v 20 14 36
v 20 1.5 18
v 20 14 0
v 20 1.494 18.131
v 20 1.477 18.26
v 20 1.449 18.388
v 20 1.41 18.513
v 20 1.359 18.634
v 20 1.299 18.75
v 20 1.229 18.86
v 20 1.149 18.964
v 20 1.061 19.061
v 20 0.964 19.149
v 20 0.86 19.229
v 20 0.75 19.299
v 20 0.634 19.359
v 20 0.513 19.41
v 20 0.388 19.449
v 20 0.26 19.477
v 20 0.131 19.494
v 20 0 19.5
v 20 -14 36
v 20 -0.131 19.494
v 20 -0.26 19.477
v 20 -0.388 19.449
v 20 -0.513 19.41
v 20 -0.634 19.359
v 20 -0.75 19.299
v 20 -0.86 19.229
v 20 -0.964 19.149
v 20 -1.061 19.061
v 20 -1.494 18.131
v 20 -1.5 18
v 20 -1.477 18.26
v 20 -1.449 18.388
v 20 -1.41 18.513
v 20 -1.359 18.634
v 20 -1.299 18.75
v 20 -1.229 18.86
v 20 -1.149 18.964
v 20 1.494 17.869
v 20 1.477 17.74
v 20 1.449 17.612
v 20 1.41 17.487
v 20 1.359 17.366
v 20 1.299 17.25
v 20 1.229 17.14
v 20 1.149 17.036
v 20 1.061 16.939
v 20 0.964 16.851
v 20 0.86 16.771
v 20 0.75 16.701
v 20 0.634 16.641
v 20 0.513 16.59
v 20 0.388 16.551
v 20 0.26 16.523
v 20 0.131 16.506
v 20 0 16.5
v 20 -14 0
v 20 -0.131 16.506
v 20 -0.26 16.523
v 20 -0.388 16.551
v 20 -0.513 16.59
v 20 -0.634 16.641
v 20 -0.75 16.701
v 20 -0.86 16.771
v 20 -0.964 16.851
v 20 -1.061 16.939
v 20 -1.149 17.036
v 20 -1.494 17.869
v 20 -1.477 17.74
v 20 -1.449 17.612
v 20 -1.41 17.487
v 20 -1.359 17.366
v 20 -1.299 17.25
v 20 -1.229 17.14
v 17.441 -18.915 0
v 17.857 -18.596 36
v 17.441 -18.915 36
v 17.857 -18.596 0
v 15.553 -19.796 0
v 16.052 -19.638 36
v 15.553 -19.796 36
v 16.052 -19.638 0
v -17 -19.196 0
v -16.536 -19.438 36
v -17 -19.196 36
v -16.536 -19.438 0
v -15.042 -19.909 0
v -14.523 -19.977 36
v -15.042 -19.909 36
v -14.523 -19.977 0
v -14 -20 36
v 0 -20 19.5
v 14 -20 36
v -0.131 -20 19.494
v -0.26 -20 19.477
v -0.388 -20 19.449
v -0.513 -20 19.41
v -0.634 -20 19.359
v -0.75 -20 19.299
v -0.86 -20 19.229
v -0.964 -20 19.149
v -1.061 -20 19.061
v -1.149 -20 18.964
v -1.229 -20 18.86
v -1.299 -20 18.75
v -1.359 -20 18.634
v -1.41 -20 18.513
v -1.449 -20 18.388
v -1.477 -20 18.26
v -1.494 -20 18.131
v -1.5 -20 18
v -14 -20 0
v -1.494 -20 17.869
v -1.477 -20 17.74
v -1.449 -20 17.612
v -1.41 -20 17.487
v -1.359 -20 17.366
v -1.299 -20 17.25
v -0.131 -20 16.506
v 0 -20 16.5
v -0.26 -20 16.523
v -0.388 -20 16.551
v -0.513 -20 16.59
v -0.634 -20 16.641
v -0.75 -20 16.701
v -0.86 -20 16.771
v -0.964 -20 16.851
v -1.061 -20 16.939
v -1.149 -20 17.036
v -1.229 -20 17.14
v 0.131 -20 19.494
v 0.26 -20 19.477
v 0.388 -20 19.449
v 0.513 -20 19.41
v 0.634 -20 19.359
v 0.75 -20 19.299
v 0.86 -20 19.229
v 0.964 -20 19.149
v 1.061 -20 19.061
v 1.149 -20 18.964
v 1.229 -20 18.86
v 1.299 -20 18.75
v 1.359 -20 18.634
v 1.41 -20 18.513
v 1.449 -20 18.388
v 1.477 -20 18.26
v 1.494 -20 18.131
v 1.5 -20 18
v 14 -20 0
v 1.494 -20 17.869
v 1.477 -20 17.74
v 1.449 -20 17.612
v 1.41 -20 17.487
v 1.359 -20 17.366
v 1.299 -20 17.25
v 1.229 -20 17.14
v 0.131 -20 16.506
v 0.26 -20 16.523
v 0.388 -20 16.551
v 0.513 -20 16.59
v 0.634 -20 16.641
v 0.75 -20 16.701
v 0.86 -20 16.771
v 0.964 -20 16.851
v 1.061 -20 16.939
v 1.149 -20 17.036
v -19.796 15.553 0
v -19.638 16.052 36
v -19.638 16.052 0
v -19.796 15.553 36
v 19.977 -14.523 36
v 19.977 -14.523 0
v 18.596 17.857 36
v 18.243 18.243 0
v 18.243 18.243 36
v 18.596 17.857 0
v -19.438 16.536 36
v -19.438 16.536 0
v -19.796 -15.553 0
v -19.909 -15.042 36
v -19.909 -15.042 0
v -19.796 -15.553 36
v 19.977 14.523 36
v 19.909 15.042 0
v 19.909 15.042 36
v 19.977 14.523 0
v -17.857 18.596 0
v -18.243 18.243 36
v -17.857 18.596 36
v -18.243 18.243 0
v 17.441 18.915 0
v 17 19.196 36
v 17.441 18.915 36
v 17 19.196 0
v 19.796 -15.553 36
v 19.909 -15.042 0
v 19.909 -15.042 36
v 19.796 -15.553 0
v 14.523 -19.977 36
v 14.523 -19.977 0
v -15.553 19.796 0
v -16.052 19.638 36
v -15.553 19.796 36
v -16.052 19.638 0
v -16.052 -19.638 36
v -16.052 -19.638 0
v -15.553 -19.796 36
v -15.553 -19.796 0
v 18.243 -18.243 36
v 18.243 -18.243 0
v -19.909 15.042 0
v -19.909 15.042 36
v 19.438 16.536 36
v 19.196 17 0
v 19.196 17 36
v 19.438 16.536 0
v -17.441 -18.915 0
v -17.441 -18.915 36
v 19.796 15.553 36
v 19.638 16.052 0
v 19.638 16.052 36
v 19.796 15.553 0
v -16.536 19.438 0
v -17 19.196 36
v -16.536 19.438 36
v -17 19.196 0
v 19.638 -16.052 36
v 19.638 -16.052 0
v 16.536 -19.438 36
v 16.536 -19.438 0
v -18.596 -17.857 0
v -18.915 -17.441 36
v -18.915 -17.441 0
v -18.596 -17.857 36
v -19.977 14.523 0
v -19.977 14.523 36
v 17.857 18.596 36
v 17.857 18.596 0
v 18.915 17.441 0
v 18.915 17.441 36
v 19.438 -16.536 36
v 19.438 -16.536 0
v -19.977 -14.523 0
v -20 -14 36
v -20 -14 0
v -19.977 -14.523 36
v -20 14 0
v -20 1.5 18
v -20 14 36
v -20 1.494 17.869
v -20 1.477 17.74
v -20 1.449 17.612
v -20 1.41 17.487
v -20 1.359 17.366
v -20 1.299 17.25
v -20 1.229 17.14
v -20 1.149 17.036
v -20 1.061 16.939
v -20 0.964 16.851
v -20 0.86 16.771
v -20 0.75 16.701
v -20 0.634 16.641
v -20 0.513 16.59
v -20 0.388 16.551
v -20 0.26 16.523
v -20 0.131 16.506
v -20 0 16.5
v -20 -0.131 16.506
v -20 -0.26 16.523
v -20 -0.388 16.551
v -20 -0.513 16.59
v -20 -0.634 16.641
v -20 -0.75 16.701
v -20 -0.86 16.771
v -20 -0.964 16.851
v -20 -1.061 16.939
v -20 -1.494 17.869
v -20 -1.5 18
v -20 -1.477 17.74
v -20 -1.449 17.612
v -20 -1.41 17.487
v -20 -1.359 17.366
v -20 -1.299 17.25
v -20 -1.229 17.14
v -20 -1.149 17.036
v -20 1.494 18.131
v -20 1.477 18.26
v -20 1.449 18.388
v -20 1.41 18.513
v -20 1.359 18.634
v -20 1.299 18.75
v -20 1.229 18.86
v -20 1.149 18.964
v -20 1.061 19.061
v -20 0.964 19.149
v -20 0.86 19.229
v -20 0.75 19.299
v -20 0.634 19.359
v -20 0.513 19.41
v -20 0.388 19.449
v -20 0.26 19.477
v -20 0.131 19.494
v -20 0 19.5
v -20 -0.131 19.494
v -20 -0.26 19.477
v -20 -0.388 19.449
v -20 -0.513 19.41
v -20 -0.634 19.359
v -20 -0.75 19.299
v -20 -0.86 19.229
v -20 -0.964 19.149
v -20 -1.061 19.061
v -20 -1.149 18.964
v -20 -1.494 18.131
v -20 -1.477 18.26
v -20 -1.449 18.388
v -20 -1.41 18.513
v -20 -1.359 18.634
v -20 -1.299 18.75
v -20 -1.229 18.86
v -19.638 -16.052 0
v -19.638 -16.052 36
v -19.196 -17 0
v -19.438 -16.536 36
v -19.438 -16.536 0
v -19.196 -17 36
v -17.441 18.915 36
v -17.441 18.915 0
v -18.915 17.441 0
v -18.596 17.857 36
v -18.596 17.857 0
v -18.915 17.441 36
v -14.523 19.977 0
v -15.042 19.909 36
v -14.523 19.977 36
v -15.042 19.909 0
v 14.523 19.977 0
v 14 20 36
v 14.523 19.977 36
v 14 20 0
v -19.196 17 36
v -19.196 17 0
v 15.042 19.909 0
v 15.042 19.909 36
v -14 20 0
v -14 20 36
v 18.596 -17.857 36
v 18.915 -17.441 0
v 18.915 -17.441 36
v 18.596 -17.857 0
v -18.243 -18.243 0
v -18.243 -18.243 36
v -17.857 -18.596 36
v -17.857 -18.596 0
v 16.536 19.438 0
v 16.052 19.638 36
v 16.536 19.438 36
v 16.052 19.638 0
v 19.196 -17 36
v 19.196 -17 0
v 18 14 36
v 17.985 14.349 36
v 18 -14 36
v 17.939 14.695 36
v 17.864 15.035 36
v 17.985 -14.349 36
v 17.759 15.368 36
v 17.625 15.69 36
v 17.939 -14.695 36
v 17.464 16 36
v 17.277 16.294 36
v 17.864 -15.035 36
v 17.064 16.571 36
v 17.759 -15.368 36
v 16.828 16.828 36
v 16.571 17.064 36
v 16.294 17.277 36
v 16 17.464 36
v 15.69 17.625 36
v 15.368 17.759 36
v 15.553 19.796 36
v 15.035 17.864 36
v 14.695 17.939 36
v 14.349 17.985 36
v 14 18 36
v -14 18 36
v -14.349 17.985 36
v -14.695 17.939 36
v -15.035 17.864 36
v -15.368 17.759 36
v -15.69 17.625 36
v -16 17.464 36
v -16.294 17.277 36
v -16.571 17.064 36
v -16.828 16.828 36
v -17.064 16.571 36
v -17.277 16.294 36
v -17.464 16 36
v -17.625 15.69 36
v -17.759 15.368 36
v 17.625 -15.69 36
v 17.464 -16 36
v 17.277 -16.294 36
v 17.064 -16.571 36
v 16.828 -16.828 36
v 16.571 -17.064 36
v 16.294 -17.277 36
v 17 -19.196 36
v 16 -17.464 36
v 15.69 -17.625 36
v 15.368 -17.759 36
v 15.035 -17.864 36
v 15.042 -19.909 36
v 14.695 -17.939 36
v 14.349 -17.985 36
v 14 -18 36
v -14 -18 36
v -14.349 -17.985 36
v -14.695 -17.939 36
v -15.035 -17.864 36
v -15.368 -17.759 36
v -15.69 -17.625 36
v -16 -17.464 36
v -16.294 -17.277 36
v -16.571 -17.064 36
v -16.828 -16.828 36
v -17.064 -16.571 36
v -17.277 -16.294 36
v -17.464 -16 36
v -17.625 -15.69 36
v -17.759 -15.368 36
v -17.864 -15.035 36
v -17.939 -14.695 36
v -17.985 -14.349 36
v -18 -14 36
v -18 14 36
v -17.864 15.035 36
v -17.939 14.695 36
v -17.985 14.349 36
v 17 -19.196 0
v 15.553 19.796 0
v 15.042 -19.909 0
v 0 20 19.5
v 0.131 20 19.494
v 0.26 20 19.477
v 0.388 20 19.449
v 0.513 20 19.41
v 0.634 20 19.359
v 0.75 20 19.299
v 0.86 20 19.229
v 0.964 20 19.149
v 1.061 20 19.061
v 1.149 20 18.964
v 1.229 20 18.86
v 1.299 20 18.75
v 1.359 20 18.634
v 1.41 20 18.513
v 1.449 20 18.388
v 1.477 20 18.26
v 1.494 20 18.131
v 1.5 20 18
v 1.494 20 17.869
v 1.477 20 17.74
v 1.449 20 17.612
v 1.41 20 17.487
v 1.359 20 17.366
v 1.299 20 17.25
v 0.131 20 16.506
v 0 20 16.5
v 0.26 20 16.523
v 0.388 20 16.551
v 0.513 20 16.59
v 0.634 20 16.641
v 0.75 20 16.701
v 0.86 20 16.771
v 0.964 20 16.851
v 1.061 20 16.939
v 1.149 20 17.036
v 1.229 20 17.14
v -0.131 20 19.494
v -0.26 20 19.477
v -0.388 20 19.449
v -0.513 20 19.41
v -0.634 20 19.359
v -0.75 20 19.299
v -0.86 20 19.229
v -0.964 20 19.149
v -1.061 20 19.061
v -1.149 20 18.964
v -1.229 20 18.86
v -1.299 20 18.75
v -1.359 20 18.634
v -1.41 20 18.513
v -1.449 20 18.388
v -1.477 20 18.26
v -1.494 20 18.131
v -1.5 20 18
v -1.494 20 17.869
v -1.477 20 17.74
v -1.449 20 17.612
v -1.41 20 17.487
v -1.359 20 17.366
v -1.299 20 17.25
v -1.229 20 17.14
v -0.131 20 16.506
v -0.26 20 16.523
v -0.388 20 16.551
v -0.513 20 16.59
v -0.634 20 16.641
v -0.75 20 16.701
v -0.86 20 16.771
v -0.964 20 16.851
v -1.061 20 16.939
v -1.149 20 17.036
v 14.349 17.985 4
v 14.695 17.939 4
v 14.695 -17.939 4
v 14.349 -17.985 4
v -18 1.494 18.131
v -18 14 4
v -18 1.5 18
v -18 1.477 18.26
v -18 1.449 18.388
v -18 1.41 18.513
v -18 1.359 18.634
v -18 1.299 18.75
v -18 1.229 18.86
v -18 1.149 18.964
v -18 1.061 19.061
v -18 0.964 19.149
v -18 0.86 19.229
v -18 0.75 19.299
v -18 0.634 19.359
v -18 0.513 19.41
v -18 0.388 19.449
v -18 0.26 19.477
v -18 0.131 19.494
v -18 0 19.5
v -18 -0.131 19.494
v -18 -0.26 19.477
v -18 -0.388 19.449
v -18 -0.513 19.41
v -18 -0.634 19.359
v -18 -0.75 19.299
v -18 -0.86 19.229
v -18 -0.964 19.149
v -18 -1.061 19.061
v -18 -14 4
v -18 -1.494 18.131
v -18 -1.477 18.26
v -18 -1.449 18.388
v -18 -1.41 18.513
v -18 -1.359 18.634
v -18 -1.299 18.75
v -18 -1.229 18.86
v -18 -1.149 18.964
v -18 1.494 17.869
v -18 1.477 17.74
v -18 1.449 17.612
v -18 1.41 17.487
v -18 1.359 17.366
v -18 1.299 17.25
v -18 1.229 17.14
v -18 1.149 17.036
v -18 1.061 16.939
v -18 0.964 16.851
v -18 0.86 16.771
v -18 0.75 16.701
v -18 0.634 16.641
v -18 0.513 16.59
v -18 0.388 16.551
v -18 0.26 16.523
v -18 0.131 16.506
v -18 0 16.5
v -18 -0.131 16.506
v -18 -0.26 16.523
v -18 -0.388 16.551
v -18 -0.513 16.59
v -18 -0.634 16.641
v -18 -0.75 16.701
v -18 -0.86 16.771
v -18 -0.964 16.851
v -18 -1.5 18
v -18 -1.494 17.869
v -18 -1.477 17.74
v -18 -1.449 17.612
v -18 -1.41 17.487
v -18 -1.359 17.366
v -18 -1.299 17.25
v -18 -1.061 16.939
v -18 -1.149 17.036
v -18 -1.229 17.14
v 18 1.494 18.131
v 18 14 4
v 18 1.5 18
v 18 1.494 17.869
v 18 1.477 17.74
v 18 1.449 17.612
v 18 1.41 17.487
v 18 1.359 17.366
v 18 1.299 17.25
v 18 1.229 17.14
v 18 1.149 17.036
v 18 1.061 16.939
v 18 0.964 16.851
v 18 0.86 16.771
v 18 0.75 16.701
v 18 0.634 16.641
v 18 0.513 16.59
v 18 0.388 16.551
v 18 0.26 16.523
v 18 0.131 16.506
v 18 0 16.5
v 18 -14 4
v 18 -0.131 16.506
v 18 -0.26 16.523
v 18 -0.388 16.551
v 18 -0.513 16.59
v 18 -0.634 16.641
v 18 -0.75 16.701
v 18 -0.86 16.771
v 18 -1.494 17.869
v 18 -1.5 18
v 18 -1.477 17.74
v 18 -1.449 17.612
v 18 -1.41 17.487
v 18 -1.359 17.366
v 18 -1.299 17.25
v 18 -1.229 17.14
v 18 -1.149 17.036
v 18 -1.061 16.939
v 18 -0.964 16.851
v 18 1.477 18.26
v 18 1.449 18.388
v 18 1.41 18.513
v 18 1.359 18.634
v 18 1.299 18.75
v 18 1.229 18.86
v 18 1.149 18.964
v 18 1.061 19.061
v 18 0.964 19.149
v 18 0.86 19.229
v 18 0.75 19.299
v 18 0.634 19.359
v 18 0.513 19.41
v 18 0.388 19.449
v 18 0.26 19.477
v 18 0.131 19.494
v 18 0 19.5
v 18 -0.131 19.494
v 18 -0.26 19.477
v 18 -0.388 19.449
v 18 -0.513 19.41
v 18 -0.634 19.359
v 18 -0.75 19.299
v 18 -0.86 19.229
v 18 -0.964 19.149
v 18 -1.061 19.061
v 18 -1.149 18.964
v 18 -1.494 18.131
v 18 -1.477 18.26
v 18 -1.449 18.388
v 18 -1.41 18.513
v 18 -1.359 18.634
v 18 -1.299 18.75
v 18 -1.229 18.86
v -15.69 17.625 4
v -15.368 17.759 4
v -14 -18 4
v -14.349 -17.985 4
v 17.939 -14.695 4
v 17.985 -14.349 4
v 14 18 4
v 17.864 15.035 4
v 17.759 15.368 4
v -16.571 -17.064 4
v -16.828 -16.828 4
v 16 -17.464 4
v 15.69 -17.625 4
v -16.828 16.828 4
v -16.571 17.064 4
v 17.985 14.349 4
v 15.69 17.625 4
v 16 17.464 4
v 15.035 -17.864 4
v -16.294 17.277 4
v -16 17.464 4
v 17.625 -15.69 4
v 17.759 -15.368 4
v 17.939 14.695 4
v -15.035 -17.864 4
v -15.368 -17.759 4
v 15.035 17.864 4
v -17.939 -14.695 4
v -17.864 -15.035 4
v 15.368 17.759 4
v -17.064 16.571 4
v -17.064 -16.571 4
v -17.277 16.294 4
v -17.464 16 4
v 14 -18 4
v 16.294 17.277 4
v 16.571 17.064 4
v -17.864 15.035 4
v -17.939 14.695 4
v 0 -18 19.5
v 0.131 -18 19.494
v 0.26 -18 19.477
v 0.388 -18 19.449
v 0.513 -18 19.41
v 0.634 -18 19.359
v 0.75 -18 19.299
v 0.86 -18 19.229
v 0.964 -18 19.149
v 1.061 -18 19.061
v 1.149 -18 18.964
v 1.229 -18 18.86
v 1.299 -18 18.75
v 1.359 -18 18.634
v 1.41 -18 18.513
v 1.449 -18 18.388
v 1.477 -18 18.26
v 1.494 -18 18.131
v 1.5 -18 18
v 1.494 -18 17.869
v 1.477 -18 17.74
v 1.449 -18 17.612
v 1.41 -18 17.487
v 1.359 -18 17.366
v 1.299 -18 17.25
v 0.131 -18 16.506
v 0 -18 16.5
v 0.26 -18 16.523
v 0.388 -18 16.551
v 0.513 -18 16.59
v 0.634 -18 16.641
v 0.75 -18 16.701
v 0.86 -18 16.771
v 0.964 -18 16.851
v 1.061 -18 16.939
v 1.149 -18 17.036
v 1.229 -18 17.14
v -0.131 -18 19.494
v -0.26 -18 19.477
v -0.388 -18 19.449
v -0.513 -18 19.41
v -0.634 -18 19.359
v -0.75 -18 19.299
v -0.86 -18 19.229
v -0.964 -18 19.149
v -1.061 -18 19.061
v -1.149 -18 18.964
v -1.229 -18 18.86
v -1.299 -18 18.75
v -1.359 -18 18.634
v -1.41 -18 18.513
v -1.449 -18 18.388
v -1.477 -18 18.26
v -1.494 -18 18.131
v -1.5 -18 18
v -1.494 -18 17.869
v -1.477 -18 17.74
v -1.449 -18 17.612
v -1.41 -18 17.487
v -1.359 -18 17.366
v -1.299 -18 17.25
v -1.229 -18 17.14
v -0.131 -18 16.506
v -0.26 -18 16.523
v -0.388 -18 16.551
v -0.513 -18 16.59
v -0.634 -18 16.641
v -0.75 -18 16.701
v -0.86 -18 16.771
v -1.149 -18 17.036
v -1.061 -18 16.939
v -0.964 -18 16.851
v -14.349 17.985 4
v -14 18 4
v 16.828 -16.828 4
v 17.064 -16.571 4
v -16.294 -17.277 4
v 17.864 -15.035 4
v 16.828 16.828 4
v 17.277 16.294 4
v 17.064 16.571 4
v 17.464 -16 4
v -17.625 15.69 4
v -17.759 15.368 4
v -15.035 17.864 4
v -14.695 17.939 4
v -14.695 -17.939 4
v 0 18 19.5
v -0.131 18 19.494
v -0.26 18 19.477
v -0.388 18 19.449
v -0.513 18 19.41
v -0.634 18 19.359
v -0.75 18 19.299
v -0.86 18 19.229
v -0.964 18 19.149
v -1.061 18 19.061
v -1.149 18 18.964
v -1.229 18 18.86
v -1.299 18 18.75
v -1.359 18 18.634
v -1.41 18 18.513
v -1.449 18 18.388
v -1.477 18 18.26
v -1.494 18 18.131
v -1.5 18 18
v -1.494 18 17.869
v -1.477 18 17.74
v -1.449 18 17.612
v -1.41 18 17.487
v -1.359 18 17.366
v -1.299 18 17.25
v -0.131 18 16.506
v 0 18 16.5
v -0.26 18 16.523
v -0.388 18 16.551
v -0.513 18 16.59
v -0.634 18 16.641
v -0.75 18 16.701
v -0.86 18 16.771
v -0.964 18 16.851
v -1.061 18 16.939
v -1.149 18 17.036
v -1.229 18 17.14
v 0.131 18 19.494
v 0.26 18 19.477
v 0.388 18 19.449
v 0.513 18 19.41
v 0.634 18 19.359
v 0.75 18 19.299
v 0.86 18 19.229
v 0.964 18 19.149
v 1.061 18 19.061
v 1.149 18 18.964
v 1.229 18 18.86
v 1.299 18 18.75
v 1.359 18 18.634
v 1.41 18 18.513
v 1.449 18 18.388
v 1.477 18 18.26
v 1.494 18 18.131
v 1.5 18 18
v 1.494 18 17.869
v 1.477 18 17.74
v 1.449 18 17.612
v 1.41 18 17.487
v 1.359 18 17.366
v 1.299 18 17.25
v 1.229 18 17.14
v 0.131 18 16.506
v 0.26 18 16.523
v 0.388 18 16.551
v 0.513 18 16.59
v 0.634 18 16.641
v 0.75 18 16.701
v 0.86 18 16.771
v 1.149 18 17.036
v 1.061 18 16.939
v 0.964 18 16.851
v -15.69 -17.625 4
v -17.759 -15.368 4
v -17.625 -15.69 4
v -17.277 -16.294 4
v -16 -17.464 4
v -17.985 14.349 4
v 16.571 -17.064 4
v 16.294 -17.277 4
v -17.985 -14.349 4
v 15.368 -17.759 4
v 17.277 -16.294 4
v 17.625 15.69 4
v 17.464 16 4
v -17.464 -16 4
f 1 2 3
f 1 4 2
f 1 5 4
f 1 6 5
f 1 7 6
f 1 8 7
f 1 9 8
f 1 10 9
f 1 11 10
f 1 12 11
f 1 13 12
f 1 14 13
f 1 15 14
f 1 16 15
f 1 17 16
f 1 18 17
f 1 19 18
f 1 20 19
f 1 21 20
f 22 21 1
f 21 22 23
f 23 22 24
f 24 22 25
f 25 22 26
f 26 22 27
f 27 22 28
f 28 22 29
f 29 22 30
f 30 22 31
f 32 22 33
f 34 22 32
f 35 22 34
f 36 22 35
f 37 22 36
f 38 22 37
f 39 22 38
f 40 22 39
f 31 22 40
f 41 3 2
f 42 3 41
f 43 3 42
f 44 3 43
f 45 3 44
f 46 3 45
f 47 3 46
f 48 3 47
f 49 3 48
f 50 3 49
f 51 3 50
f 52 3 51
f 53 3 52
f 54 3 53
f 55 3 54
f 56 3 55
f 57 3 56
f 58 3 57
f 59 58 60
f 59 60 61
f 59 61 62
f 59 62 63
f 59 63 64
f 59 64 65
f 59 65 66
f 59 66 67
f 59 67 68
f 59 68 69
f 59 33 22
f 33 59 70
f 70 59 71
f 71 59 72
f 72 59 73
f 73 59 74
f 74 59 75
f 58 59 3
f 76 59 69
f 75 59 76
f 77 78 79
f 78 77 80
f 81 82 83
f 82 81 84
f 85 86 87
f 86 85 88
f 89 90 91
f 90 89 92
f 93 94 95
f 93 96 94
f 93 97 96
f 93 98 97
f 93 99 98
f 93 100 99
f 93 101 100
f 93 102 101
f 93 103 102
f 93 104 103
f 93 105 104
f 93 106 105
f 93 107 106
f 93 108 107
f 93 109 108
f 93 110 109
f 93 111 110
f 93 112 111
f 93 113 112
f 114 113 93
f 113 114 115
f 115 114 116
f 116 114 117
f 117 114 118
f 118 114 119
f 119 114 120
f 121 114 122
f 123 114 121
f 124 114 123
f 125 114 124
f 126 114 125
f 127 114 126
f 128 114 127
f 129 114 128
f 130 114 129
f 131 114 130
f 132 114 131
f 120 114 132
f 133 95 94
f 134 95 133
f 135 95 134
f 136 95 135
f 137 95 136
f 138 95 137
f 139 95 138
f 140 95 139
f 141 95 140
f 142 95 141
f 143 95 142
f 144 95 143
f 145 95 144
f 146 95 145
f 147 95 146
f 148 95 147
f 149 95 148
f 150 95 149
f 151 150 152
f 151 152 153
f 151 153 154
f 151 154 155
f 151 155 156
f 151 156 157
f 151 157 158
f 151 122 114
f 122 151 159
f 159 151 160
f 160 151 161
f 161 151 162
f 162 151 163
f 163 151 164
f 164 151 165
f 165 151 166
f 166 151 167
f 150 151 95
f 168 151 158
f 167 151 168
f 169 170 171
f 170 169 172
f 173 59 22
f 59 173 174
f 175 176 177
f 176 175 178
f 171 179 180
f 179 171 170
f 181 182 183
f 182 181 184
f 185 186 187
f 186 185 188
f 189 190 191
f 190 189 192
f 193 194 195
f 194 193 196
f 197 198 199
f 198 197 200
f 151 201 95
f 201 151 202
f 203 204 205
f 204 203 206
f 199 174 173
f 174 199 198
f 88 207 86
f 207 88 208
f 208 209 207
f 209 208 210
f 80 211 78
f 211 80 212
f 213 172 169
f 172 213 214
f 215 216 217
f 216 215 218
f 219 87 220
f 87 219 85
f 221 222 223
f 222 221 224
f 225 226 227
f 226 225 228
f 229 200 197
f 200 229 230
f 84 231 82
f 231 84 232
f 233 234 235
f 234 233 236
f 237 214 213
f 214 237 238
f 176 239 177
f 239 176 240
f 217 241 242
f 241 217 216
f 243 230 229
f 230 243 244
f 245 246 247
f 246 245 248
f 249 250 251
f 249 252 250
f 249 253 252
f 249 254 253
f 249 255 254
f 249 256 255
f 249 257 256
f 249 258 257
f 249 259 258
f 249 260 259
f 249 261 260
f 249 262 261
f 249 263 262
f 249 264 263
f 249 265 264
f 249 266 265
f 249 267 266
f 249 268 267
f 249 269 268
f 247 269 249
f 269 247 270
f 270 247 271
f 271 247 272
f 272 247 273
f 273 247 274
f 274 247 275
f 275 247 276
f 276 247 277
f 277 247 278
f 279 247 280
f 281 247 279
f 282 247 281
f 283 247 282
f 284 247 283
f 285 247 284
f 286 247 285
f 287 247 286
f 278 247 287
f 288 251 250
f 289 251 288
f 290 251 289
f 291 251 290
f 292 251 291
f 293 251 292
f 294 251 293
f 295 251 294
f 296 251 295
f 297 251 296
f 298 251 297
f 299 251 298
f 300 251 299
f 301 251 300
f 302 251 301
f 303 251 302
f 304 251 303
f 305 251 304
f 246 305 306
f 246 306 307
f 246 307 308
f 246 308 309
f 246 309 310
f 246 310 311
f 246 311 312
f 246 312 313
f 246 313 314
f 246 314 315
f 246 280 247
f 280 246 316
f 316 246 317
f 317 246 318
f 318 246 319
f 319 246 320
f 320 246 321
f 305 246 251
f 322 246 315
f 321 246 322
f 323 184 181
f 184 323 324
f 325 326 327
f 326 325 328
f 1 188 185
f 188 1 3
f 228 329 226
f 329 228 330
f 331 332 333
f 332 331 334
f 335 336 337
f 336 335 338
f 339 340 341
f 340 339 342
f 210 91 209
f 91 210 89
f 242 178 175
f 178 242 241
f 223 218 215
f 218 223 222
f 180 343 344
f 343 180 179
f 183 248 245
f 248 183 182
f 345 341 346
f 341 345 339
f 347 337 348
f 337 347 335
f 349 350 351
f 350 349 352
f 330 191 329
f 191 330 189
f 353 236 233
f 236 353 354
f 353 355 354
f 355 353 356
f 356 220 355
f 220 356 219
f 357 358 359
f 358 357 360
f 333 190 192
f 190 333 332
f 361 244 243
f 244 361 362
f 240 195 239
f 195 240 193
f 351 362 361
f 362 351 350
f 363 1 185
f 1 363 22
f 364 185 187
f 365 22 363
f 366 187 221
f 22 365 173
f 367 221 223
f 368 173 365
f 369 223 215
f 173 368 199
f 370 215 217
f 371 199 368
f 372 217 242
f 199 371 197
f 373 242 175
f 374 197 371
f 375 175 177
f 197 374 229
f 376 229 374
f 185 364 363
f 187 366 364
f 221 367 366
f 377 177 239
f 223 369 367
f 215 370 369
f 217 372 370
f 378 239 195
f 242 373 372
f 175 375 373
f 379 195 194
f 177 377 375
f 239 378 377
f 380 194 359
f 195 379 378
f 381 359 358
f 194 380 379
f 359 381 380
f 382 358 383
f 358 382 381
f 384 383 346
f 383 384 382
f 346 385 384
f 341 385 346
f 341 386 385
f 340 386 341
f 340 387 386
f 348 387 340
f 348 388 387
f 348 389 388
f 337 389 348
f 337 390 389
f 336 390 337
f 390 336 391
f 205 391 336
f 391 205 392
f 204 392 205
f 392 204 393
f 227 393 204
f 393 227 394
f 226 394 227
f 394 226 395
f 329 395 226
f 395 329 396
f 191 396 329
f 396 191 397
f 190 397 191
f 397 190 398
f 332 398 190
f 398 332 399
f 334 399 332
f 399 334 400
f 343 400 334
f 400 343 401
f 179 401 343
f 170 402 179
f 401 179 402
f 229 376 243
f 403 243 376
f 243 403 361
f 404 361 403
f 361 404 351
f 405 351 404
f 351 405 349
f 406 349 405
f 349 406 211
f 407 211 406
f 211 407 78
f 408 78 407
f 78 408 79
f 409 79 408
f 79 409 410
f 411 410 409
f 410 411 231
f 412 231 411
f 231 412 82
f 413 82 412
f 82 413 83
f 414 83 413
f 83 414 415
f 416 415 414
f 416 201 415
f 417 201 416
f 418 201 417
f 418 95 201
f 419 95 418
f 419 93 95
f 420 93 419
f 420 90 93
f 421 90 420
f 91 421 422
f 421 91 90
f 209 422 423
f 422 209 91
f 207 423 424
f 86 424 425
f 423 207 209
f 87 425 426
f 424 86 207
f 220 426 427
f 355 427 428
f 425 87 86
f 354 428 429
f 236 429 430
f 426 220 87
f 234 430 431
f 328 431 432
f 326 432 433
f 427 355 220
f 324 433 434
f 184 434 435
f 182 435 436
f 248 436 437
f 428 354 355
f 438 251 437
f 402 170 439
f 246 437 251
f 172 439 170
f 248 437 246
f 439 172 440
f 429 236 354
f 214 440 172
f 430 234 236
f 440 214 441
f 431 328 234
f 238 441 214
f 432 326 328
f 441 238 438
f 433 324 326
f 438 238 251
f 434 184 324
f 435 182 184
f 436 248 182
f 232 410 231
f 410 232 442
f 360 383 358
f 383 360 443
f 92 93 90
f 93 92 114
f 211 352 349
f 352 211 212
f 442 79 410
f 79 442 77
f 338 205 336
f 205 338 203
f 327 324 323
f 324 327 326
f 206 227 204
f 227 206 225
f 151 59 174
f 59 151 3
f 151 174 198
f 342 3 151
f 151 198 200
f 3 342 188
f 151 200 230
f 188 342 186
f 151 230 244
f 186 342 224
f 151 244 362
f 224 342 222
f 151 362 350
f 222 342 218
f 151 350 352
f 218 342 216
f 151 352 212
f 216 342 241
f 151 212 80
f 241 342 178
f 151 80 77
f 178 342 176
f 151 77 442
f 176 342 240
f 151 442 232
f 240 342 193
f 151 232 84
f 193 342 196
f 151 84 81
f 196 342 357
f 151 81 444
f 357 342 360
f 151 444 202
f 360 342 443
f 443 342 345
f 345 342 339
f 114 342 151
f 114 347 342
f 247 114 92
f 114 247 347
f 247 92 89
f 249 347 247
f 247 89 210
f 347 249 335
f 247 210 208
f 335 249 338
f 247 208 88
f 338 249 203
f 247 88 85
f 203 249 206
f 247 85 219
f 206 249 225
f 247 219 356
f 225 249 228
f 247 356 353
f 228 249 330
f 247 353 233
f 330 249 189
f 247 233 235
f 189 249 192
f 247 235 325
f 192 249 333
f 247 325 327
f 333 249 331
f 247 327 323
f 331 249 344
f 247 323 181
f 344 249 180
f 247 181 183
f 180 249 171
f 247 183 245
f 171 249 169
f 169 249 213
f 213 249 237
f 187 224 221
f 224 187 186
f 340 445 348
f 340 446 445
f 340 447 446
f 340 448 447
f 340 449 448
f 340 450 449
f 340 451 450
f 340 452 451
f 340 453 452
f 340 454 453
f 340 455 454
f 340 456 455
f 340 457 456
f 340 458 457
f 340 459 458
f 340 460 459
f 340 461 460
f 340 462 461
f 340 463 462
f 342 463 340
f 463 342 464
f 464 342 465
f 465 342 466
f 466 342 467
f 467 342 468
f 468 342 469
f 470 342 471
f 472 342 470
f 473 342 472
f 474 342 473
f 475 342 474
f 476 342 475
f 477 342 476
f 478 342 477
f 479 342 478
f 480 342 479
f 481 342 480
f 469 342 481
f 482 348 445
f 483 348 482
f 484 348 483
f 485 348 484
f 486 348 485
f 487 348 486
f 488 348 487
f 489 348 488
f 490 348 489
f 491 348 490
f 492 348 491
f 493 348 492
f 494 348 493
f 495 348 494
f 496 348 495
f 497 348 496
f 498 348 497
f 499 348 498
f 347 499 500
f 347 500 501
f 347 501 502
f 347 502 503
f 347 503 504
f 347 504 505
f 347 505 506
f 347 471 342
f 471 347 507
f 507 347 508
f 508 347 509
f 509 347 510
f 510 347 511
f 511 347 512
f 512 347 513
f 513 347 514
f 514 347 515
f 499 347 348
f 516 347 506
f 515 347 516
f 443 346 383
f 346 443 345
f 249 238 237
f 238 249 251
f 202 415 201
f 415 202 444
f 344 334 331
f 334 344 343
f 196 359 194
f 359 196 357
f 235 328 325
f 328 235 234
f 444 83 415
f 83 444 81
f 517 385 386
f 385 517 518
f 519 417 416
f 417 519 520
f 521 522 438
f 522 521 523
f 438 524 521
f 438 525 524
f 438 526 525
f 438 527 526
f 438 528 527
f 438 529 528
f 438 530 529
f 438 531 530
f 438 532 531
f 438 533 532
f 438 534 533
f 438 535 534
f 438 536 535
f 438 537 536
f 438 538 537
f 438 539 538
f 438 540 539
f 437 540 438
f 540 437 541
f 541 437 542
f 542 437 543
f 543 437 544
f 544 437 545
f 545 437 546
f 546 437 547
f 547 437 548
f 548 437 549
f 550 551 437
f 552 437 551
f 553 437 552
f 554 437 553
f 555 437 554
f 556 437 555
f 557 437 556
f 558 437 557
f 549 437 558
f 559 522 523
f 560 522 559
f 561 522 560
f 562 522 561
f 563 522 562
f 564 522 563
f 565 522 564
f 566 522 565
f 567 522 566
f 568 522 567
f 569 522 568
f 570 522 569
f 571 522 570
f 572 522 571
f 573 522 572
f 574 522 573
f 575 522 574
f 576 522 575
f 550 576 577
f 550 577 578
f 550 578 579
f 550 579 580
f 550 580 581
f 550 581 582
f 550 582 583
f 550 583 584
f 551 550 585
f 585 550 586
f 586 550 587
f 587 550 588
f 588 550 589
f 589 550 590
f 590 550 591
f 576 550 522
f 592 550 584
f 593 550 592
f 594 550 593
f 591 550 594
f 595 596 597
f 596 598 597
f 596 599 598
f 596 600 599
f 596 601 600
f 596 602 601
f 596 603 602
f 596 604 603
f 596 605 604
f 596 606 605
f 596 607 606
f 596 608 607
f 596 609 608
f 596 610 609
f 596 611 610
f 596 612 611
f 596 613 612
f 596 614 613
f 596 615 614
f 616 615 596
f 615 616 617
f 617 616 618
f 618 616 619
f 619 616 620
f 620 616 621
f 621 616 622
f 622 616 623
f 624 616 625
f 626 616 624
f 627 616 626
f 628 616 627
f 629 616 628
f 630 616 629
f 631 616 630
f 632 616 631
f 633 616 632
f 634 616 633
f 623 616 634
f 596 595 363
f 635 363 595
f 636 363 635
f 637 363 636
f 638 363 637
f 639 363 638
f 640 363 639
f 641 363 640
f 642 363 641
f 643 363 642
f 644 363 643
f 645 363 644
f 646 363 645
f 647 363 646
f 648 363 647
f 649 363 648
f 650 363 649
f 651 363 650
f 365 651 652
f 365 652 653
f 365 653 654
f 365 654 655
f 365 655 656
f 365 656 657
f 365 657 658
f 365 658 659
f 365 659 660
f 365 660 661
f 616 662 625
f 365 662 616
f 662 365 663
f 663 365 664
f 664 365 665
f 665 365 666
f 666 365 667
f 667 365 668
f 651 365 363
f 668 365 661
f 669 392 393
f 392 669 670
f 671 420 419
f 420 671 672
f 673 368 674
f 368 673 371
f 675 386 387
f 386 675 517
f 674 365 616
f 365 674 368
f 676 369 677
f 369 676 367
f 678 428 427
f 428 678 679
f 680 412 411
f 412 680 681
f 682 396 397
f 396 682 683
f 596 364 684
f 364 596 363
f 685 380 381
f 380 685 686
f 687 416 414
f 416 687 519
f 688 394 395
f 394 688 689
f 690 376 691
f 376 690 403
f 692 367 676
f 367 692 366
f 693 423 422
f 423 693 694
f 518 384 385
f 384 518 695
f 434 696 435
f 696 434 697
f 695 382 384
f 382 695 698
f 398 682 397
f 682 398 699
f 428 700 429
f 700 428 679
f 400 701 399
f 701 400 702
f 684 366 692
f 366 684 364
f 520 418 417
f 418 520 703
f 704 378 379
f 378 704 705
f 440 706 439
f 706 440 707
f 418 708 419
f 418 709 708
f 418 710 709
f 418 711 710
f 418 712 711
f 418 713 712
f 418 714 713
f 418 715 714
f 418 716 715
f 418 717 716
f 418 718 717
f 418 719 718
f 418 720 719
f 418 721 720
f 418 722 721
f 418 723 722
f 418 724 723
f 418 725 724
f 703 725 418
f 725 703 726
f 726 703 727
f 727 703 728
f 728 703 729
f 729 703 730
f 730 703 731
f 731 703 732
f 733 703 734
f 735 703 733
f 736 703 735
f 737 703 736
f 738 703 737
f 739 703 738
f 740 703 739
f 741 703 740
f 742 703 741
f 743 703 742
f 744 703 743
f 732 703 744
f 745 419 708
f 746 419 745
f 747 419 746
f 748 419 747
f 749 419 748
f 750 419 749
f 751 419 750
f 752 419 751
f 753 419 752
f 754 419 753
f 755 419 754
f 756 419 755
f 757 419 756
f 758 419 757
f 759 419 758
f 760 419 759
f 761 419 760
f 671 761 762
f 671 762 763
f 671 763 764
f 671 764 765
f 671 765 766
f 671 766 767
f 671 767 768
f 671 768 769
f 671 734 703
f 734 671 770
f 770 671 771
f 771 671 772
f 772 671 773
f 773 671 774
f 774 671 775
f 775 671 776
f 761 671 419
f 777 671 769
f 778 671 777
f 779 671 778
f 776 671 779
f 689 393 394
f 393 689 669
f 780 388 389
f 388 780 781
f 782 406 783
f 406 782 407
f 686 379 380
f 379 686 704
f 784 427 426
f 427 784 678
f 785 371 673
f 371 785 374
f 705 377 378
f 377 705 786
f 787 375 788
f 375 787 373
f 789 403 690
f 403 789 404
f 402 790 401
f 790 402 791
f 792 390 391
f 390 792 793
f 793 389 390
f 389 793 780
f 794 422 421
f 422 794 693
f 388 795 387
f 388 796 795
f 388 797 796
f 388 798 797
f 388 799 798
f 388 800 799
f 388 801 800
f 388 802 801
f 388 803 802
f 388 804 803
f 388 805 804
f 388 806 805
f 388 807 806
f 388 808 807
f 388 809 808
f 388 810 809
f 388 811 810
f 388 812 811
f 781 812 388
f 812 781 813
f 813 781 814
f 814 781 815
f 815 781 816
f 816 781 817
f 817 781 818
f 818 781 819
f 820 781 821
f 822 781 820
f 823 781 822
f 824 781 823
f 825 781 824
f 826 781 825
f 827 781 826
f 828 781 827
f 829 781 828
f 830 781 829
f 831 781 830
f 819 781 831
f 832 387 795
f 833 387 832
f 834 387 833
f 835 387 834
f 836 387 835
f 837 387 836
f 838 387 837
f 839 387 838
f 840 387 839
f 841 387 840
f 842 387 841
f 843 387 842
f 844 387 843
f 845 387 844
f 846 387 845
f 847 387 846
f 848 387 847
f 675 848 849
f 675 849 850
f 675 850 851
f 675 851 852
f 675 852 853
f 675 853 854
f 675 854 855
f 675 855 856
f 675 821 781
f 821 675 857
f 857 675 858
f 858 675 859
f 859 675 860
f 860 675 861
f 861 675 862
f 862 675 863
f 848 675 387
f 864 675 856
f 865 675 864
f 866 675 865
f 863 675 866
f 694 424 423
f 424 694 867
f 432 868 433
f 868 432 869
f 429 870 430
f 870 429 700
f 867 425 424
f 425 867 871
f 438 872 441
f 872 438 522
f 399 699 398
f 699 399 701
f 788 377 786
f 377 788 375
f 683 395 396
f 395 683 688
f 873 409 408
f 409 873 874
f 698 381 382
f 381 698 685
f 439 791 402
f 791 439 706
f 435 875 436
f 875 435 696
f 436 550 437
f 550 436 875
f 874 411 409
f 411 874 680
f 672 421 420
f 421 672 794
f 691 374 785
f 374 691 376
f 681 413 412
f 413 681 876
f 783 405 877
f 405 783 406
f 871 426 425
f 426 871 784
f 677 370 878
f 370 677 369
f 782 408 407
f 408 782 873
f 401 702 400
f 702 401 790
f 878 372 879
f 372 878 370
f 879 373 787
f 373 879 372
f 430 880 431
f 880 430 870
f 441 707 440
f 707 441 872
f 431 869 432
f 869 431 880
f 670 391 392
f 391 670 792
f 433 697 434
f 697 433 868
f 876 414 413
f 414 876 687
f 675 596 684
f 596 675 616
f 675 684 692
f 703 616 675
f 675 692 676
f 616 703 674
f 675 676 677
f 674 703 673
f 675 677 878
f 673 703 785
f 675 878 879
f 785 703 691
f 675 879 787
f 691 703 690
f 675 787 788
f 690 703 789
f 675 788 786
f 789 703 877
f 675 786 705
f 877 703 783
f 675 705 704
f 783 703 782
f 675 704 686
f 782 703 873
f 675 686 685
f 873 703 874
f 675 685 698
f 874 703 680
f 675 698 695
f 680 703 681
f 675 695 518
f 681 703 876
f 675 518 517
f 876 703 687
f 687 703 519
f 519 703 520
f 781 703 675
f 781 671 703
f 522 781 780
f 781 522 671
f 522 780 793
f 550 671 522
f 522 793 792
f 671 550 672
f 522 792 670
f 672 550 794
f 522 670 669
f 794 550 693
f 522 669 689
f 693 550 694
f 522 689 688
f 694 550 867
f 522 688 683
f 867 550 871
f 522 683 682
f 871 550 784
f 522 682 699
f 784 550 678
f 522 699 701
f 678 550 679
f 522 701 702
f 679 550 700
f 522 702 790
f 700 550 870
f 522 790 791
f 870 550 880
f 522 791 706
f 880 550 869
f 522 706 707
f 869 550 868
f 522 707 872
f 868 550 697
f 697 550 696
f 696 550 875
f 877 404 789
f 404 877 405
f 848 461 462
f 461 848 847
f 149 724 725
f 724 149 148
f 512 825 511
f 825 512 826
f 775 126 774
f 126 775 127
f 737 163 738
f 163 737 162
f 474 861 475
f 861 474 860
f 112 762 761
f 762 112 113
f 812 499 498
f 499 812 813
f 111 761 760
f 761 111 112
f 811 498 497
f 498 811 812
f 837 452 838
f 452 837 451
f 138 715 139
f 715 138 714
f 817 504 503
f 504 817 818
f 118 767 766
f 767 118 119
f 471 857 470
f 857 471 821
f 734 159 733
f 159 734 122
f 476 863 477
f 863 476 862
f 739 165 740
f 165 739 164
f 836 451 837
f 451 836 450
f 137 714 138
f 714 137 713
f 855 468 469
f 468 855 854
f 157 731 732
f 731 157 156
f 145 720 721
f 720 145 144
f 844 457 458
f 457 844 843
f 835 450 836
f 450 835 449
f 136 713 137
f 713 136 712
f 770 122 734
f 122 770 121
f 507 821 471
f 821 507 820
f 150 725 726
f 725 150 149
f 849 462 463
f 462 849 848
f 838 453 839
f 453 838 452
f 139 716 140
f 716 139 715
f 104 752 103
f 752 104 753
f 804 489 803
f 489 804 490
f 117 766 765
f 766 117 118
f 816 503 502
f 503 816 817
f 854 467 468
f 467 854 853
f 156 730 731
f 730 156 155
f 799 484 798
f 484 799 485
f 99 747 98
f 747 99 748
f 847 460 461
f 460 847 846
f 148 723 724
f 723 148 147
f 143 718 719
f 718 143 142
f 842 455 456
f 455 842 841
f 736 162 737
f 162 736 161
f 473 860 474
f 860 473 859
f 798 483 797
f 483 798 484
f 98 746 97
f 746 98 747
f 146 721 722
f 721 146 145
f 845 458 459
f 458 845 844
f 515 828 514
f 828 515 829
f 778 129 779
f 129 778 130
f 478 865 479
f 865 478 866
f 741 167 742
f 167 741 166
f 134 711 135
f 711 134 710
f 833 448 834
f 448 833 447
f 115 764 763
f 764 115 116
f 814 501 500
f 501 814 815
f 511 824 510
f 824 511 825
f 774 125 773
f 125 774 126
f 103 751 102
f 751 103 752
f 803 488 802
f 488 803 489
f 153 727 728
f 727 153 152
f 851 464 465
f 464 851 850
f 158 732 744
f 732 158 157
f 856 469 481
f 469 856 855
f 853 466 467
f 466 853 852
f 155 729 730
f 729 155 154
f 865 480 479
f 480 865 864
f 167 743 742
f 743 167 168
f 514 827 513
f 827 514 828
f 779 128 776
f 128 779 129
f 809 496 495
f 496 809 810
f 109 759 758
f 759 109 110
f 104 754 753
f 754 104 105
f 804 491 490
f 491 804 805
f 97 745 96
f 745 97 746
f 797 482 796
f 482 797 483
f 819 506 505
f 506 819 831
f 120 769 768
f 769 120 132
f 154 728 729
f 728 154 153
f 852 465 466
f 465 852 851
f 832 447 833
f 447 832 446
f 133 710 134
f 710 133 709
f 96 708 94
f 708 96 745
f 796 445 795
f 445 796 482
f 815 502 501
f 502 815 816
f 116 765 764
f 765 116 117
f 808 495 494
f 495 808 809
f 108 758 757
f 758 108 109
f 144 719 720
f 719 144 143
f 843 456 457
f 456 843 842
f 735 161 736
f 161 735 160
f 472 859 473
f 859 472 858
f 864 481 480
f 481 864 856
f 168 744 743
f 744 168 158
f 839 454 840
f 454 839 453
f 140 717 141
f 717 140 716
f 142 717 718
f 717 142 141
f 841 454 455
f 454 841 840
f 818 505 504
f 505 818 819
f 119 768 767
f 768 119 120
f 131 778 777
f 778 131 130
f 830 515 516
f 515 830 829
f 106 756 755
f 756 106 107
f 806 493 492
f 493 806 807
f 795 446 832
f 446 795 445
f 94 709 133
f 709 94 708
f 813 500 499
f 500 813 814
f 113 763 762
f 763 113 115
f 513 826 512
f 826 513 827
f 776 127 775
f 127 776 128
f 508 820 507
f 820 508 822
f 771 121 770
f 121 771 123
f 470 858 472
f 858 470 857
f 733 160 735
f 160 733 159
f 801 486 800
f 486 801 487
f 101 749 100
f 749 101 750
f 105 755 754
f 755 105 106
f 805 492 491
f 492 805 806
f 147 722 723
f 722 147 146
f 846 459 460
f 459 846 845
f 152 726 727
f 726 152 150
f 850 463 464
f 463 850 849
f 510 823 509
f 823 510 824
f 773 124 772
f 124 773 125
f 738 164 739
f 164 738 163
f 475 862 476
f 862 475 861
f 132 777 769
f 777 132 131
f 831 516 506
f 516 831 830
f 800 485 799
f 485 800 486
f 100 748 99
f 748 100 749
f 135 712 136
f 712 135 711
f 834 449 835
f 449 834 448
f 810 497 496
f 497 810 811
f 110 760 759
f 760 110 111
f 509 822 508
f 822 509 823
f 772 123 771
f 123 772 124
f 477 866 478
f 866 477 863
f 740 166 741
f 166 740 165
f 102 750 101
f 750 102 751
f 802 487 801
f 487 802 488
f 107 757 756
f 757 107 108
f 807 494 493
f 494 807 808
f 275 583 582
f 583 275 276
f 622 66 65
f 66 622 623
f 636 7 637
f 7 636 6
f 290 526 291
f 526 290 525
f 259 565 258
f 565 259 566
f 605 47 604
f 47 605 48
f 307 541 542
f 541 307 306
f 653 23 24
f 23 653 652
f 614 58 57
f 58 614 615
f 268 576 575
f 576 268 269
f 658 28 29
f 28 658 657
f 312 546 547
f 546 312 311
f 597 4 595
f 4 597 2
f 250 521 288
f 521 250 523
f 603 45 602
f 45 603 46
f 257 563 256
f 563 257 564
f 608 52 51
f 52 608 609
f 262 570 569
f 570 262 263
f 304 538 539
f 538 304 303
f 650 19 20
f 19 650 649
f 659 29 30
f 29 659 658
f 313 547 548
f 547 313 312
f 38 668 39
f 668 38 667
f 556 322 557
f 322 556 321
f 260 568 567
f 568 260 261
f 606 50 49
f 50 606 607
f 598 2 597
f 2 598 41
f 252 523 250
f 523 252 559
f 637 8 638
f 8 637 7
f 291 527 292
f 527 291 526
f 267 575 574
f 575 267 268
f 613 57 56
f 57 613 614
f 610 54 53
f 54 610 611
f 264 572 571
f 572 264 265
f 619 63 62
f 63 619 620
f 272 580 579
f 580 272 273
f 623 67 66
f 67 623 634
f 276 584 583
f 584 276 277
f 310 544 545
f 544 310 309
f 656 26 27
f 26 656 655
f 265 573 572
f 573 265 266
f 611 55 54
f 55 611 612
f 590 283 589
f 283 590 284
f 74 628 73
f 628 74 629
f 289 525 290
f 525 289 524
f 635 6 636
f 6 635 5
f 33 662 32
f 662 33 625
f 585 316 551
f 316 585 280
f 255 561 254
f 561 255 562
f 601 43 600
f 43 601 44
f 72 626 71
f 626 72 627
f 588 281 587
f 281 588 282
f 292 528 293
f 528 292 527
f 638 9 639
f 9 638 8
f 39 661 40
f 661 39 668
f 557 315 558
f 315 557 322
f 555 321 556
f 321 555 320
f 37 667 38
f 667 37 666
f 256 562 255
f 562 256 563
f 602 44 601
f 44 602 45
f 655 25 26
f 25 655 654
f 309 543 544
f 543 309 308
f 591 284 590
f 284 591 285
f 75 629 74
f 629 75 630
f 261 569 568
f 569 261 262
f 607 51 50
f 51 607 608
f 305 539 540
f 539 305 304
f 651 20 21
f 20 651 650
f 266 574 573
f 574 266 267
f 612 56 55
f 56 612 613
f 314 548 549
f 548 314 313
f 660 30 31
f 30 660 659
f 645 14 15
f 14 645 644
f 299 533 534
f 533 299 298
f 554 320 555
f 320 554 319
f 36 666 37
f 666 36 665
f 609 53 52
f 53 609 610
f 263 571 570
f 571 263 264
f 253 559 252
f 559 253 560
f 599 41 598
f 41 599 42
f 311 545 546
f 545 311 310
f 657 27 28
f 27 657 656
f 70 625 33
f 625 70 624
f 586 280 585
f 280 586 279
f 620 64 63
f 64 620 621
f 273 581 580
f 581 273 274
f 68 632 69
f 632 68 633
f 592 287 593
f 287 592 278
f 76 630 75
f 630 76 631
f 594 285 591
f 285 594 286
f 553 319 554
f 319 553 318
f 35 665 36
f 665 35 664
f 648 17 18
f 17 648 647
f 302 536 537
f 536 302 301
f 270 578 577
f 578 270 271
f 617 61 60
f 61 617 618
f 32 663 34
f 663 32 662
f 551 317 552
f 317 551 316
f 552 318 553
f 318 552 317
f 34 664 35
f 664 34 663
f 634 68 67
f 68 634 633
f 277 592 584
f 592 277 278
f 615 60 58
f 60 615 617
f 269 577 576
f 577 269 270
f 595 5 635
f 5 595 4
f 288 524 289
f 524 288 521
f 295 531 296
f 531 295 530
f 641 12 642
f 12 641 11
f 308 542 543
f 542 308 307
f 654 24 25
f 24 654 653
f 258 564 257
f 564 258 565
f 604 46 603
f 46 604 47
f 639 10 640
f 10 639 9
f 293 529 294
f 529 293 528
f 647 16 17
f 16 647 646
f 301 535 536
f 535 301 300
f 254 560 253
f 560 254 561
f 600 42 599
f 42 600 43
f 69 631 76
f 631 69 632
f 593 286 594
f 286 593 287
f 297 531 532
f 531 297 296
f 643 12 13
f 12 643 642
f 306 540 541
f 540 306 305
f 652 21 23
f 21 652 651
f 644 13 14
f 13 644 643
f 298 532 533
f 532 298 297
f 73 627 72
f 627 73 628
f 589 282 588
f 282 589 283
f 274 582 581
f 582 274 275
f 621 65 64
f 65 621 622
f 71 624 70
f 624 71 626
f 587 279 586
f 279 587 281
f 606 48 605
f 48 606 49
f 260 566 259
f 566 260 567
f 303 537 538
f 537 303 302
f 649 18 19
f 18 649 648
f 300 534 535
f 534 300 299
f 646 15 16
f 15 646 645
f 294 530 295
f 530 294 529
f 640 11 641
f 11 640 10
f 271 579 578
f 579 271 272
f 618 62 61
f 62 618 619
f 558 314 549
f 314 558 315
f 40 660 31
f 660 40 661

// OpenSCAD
INNER_WIDTH_MM          = 36;
INNER_LENGTH_MM         = 36;
HEIGHT_MM               = 36;
WALL_THICKNESS_MM       = 2;
BASE_THICKNESS_MM       = 4;
FILLET_RAD_MM           = 4;

HOLE_DIA_MM             = 3;


FILLED_DIA_MM           = FILLET_RAD_MM*2;
$fn=72;

module rounded_cube(length, width, height, fillet_radius) {
    hull() {
        translate([-1*(length/2-fillet_radius), -1*(width/2 - fillet_radius), 0]) {
            cylinder(h=height, r=fillet_radius);
        }
        translate([-1*(length/2-fillet_radius), (width/2 - fillet_radius), 0]) {
            cylinder(h=height, r=fillet_radius);
        }
        translate([(length/2-fillet_radius), -1*(width/2 - fillet_radius), 0]) {
            cylinder(h=height, r=fillet_radius);
        }
        translate([(length/2-fillet_radius), (width/2 - fillet_radius), 0]) {
            cylinder(h=height, r=fillet_radius);
        }
    };
}

module main_body() {
    difference() {
        rounded_cube(INNER_WIDTH_MM  + WALL_THICKNESS_MM*2,
                     INNER_LENGTH_MM + WALL_THICKNESS_MM*2,
                     HEIGHT_MM, 
                     FILLET_RAD_MM+WALL_THICKNESS_MM);
        translate([0,0,BASE_THICKNESS_MM]) {
            rounded_cube(INNER_WIDTH_MM, INNER_LENGTH_MM, HEIGHT_MM, FILLET_RAD_MM);
        }
    }
}

module holes() {
   translate([0,0,HEIGHT_MM/2]) {
        union() {
            rotate([90,0,0]) {
                cylinder(h=INNER_WIDTH_MM*2, d=HOLE_DIA_MM, center=true);
            }
            rotate([0,90,0]) {
                cylinder(h=INNER_LENGTH_MM*2, d=HOLE_DIA_MM, center=true);
            }
        }
    } 
}

module main() {
    
    difference() {
        main_body();
        holes();
    }
}

main();
